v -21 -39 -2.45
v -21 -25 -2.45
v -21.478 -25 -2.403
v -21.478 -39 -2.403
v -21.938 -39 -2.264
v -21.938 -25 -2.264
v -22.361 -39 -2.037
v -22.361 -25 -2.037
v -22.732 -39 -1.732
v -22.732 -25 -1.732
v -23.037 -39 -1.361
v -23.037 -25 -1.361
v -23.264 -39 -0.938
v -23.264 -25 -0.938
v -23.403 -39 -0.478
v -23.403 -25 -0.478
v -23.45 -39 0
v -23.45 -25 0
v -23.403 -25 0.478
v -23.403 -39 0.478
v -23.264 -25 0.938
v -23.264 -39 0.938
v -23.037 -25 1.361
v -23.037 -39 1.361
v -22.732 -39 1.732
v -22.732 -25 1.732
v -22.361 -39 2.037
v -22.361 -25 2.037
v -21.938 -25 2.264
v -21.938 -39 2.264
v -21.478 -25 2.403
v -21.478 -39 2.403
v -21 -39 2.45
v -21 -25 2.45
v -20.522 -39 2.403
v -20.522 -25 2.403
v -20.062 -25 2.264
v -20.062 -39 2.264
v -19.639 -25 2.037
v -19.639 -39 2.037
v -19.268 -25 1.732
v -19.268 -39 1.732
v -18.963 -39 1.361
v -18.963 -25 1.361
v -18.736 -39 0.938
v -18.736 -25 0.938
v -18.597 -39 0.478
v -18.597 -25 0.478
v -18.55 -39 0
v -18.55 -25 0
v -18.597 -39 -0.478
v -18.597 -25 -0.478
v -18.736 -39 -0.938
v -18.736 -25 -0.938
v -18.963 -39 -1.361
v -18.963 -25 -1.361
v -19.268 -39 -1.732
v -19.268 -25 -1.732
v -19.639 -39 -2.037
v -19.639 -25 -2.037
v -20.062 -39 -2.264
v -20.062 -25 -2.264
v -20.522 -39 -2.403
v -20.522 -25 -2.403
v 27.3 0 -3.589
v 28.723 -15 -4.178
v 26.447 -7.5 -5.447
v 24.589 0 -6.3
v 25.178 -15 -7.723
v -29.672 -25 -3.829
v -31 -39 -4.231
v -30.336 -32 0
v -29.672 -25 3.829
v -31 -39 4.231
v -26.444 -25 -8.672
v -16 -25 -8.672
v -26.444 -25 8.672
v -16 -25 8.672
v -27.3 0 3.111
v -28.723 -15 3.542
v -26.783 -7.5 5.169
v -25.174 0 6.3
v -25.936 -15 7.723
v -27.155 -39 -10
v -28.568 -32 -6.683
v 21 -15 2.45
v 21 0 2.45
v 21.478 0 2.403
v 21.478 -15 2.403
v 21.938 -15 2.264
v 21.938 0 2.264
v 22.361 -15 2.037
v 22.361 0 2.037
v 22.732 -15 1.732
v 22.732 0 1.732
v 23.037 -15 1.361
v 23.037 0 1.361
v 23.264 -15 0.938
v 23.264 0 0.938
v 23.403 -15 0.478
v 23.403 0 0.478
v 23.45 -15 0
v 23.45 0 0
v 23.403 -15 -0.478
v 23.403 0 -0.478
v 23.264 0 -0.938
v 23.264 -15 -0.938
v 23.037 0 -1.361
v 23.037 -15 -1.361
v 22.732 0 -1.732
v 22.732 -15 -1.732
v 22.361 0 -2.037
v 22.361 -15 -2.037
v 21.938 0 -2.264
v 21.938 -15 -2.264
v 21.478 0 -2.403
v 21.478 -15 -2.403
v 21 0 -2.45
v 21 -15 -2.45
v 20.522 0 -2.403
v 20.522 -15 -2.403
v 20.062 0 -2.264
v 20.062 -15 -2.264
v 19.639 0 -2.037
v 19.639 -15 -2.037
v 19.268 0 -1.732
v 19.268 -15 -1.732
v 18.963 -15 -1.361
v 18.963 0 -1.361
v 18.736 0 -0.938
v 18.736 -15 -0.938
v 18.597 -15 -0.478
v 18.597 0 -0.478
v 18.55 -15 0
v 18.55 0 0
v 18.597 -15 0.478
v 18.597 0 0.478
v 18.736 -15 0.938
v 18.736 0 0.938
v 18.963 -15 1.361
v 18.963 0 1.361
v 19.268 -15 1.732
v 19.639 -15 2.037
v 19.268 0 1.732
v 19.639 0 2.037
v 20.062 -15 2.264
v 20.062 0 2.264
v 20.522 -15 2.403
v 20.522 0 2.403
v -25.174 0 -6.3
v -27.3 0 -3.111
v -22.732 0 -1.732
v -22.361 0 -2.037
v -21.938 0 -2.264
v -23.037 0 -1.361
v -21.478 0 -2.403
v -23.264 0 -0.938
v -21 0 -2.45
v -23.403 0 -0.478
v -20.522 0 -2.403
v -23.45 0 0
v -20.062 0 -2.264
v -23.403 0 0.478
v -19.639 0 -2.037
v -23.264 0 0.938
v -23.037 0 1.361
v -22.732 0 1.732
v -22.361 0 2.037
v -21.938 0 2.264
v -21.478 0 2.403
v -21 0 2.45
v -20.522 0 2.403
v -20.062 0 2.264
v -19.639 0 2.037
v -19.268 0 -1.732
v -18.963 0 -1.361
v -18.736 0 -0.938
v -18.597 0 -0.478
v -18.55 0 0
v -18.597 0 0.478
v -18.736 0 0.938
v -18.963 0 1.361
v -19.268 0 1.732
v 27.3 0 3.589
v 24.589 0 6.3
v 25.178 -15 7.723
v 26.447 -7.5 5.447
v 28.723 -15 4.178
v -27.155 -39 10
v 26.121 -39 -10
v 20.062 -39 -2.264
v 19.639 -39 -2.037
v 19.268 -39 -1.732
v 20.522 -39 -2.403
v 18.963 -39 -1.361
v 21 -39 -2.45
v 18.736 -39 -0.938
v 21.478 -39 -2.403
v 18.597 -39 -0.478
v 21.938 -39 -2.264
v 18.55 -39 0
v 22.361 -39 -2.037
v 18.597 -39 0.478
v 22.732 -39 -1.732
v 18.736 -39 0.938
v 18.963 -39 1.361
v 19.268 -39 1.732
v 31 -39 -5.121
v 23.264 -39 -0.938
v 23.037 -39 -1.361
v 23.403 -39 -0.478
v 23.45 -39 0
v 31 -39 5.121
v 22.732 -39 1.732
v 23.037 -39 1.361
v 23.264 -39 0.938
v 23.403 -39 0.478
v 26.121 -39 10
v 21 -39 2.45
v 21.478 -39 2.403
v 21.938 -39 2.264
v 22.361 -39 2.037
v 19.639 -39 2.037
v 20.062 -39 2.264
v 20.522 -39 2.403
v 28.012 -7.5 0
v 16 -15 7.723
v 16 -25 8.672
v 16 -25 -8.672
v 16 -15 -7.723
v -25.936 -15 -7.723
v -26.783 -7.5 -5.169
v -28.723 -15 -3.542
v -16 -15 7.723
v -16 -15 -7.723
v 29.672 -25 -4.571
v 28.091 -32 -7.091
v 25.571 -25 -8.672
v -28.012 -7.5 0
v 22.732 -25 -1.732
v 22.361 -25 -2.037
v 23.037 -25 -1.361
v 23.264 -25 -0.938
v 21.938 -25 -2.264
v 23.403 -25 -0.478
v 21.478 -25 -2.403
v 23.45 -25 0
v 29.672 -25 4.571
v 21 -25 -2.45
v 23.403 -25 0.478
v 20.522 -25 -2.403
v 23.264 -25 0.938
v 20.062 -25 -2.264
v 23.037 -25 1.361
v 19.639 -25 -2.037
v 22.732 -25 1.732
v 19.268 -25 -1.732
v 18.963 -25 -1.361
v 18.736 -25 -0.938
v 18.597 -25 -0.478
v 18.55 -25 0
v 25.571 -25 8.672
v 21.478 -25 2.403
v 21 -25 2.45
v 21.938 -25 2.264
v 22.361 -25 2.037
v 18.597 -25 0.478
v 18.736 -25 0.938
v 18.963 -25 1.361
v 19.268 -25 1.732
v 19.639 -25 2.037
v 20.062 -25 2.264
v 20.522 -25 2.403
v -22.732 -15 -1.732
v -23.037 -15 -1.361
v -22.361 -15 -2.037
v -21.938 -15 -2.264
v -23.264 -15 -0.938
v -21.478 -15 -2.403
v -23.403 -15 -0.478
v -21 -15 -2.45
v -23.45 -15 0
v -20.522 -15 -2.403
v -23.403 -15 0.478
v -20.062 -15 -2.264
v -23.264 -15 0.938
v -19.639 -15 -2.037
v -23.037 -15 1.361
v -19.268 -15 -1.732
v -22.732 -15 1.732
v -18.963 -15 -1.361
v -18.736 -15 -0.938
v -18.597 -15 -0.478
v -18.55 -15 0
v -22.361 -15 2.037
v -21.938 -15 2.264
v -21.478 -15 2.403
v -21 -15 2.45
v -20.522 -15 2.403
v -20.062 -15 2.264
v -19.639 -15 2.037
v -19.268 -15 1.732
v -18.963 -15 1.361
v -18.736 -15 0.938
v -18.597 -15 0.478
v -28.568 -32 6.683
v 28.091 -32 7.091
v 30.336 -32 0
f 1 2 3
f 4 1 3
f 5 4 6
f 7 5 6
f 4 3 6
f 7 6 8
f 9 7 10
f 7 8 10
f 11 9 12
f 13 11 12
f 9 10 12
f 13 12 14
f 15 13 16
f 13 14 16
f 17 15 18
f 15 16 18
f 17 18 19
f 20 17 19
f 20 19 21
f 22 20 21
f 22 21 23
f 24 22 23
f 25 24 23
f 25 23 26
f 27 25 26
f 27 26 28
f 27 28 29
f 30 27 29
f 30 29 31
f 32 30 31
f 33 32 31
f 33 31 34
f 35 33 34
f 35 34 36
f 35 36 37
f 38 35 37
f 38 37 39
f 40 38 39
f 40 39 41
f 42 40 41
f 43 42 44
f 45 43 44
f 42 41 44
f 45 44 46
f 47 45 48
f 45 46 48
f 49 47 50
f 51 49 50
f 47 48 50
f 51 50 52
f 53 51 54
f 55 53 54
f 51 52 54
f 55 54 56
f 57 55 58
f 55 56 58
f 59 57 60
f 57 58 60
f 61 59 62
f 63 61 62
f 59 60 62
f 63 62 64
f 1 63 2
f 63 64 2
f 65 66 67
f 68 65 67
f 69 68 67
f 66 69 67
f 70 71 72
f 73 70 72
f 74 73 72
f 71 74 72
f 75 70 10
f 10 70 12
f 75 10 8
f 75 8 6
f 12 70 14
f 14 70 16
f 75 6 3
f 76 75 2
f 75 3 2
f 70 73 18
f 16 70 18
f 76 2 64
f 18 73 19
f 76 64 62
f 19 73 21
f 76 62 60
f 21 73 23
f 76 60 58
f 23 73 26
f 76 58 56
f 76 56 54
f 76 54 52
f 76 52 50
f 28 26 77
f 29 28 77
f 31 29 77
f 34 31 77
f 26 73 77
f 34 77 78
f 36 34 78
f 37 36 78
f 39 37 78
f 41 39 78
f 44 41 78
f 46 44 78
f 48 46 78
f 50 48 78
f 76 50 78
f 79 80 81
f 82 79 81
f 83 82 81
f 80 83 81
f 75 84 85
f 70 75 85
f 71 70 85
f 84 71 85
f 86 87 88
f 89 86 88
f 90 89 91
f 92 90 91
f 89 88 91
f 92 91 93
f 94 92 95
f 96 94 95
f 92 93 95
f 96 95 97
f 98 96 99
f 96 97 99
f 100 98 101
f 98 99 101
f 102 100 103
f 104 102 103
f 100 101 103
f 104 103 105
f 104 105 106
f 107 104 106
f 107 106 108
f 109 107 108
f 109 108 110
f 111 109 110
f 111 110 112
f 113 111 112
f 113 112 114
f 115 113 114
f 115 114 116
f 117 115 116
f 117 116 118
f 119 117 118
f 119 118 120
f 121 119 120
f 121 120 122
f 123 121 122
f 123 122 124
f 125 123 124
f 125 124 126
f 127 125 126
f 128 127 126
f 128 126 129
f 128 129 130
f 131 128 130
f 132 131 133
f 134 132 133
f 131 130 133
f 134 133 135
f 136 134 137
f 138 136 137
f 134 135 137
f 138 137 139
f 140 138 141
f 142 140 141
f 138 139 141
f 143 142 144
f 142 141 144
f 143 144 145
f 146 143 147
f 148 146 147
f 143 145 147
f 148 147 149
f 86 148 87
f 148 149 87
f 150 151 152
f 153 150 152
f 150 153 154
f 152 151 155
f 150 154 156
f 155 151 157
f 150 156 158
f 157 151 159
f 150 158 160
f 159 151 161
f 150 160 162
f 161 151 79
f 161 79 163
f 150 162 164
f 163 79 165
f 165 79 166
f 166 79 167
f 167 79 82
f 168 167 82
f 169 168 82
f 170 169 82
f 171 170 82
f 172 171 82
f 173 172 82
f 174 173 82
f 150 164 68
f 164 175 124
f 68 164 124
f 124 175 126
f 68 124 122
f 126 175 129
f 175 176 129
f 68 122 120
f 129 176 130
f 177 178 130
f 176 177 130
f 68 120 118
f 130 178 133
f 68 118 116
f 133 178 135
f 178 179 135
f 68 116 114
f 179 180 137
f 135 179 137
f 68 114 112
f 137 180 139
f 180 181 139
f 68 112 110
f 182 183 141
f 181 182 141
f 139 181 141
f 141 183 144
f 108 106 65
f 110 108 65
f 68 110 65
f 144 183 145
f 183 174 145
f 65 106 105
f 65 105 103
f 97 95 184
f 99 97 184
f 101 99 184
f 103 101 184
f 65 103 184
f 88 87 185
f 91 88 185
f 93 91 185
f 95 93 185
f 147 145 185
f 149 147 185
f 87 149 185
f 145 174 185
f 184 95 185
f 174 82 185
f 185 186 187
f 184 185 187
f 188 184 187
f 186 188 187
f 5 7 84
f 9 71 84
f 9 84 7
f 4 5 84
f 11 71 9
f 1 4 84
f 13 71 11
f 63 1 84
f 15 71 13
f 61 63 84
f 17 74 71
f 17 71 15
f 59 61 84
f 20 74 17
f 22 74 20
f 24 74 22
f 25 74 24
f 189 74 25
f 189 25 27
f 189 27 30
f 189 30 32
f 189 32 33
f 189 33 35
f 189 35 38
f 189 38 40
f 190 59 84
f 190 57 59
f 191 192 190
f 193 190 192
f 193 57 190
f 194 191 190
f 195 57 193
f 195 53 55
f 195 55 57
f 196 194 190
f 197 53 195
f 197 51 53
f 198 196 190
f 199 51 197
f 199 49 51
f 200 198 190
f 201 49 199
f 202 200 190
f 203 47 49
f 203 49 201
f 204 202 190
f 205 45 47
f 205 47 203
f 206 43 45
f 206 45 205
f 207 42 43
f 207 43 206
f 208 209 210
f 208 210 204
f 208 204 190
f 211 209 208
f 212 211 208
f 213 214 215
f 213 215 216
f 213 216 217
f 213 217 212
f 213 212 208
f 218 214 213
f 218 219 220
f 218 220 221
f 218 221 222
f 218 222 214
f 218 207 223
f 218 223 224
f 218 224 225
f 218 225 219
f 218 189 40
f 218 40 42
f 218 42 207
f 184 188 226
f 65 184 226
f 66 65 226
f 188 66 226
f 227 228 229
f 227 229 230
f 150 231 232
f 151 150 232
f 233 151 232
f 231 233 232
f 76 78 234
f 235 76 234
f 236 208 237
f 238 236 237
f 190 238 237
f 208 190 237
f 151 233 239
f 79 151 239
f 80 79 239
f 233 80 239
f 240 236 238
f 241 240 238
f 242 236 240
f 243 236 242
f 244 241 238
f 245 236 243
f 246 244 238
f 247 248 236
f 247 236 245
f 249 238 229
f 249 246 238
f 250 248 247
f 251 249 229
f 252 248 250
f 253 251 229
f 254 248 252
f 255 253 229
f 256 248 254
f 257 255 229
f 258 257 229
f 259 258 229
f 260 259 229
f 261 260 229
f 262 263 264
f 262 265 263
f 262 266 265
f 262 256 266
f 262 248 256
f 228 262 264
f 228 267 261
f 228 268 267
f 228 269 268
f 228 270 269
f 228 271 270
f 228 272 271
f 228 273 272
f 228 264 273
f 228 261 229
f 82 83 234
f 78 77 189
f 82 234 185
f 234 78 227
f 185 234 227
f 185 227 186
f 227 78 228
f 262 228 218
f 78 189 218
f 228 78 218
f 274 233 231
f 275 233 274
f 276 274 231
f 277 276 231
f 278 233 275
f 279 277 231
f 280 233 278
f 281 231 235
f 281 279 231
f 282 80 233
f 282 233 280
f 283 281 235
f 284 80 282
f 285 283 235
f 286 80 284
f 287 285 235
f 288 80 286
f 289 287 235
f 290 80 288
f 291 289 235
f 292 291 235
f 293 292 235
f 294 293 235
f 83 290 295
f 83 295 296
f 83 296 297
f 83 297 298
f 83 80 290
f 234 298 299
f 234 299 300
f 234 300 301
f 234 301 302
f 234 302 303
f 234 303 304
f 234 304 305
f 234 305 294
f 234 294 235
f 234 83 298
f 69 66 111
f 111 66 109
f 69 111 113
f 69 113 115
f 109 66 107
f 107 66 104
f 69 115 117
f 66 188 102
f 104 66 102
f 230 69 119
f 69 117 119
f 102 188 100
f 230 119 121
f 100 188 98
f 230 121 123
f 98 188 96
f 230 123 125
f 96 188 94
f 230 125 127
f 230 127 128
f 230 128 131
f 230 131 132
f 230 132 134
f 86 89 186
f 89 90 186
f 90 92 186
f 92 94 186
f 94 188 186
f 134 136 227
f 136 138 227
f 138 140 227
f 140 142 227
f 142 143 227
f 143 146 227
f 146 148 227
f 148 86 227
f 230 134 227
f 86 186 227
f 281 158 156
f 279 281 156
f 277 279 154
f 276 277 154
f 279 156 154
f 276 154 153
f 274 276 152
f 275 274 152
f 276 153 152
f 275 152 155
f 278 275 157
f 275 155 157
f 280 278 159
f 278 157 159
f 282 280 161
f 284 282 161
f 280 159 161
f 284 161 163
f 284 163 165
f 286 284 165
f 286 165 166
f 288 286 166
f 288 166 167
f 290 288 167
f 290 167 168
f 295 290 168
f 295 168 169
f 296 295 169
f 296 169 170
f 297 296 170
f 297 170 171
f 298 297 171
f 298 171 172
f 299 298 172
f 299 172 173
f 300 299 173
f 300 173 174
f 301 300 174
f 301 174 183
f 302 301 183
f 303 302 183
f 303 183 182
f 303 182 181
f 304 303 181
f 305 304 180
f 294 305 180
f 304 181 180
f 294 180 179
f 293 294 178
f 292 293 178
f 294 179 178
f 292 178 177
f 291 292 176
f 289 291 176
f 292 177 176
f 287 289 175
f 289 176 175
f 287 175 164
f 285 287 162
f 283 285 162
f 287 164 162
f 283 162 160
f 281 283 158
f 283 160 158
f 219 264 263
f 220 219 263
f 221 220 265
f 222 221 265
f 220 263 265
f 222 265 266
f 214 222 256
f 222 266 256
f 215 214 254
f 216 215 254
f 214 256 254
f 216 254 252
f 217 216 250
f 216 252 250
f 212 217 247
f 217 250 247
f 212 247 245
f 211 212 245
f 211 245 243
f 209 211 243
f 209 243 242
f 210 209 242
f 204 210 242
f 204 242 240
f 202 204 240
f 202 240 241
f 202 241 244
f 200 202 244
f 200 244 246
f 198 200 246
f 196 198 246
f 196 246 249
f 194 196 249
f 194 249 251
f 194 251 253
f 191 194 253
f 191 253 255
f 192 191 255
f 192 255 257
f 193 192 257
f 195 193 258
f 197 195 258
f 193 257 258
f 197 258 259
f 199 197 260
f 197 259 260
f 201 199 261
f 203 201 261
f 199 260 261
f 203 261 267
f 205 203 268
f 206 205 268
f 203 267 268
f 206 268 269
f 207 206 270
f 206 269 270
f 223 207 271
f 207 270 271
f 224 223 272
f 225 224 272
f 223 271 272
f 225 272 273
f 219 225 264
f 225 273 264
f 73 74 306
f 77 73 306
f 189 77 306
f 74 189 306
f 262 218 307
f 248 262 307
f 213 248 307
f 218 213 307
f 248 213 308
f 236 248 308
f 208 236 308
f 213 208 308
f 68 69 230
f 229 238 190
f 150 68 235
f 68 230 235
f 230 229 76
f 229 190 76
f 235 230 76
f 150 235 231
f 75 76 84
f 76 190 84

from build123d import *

# Parameters (mm, degrees)
CUT_EXTRUDE1_DEPTH = 51.813384221
SKETCH3_W          = 20.914953444
SKETCH3_H          = 10
CUT_EXTRUDE2_DEPTH = 51.813384221


with BuildPart() as part:
    # Sketch1 → Loft1 section 0
    with BuildSketch(Plane(origin=(0, 0, 0), x_dir=(1, 0, 0), z_dir=(0, 1, 0))):
        with BuildLine():
            Line((-25.17448832, 6.3), (-27.3, 3.111028865))
            Line((-27.3, 3.111028865), (-27.3, -3.111028865))
            Line((-27.3, -3.111028865), (-25.17448832, -6.3))
            Line((-25.17448832, -6.3), (-13.695486873, -6.3))
            Line((-13.695486873, -6.3), (13.695486873, -6.3))
            Line((13.695486873, -6.3), (24.588730163, -6.3))
            Line((24.588730163, -6.3), (27.3, -3.588730163))
            Line((27.3, -3.588730163), (27.3, 3.588730163))
            Line((27.3, 3.588730163), (24.588730163, 6.3))
            Line((24.588730163, 6.3), (13.695486873, 6.3))
            Line((13.695486873, 6.3), (-13.695486873, 6.3))
            Line((-13.695486873, 6.3), (-25.17448832, 6.3))
        make_face()
    # Sketch2 → Loft1 section 1
    with BuildSketch(Plane(origin=(0, -39, 0), x_dir=(1, 0, 0), z_dir=(0, 1, 0))):
        with BuildLine():
            Line((26.121320344, 10), (13.695486873, 10))
            Line((13.695486873, 10), (-13.695486873, 10))
            Line((-13.695486873, 10), (-27.154910603, 10))
            Line((-27.154910603, 10), (-31, 4.231093051))
            Line((-31, 4.231093051), (-31, -4.231093051))
            Line((-31, -4.231093051), (-27.154910603, -10))
            Line((-27.154910603, -10), (-13.695486873, -10))
            Line((-13.695486873, -10), (13.695486873, -10))
            Line((13.695486873, -10), (26.121320344, -10))
            Line((26.121320344, -10), (31, -5.121320344))
            Line((31, -5.121320344), (31, 5.121320344))
            Line((31, 5.121320344), (26.121320344, 10))
        make_face()
    loft()

    # Sketch1<4> → Cut-Extrude1 (cut, through all)
    with BuildSketch(Plane(origin=(0, 0, 0), x_dir=(1, 0, 0), z_dir=(0, 1, 0))):
        with BuildLine():
            ThreePointArc((21, 2.45), (18.55, 0), (21, -2.45))
            ThreePointArc((21, -2.45), (23.45, 0), (21, 2.45))
        make_face()
        with BuildLine():
            ThreePointArc((-21, -2.45), (-18.55, 0), (-21, 2.45))
            ThreePointArc((-21, 2.45), (-23.45, 0), (-21, -2.45))
        make_face()
    extrude(amount=-CUT_EXTRUDE1_DEPTH, mode=Mode.SUBTRACT)

    # Sketch3 → Cut-Extrude2 (cut, symmetric)
    with BuildSketch(Plane.XY):
        with Locations((-26.457476722, -20)):
            Rectangle(SKETCH3_W, SKETCH3_H)
    cut_extrude2 = extrude(amount=CUT_EXTRUDE2_DEPTH, both=True, mode=Mode.SUBTRACT)

    # Mirror1: Cut-Extrude2 across plane
    add(cut_extrude2.mirror(Plane(origin=(0, 0, 0), x_dir=(0, 0, 1), z_dir=(1, 0, 0))), mode=Mode.SUBTRACT)


solid = part.part
